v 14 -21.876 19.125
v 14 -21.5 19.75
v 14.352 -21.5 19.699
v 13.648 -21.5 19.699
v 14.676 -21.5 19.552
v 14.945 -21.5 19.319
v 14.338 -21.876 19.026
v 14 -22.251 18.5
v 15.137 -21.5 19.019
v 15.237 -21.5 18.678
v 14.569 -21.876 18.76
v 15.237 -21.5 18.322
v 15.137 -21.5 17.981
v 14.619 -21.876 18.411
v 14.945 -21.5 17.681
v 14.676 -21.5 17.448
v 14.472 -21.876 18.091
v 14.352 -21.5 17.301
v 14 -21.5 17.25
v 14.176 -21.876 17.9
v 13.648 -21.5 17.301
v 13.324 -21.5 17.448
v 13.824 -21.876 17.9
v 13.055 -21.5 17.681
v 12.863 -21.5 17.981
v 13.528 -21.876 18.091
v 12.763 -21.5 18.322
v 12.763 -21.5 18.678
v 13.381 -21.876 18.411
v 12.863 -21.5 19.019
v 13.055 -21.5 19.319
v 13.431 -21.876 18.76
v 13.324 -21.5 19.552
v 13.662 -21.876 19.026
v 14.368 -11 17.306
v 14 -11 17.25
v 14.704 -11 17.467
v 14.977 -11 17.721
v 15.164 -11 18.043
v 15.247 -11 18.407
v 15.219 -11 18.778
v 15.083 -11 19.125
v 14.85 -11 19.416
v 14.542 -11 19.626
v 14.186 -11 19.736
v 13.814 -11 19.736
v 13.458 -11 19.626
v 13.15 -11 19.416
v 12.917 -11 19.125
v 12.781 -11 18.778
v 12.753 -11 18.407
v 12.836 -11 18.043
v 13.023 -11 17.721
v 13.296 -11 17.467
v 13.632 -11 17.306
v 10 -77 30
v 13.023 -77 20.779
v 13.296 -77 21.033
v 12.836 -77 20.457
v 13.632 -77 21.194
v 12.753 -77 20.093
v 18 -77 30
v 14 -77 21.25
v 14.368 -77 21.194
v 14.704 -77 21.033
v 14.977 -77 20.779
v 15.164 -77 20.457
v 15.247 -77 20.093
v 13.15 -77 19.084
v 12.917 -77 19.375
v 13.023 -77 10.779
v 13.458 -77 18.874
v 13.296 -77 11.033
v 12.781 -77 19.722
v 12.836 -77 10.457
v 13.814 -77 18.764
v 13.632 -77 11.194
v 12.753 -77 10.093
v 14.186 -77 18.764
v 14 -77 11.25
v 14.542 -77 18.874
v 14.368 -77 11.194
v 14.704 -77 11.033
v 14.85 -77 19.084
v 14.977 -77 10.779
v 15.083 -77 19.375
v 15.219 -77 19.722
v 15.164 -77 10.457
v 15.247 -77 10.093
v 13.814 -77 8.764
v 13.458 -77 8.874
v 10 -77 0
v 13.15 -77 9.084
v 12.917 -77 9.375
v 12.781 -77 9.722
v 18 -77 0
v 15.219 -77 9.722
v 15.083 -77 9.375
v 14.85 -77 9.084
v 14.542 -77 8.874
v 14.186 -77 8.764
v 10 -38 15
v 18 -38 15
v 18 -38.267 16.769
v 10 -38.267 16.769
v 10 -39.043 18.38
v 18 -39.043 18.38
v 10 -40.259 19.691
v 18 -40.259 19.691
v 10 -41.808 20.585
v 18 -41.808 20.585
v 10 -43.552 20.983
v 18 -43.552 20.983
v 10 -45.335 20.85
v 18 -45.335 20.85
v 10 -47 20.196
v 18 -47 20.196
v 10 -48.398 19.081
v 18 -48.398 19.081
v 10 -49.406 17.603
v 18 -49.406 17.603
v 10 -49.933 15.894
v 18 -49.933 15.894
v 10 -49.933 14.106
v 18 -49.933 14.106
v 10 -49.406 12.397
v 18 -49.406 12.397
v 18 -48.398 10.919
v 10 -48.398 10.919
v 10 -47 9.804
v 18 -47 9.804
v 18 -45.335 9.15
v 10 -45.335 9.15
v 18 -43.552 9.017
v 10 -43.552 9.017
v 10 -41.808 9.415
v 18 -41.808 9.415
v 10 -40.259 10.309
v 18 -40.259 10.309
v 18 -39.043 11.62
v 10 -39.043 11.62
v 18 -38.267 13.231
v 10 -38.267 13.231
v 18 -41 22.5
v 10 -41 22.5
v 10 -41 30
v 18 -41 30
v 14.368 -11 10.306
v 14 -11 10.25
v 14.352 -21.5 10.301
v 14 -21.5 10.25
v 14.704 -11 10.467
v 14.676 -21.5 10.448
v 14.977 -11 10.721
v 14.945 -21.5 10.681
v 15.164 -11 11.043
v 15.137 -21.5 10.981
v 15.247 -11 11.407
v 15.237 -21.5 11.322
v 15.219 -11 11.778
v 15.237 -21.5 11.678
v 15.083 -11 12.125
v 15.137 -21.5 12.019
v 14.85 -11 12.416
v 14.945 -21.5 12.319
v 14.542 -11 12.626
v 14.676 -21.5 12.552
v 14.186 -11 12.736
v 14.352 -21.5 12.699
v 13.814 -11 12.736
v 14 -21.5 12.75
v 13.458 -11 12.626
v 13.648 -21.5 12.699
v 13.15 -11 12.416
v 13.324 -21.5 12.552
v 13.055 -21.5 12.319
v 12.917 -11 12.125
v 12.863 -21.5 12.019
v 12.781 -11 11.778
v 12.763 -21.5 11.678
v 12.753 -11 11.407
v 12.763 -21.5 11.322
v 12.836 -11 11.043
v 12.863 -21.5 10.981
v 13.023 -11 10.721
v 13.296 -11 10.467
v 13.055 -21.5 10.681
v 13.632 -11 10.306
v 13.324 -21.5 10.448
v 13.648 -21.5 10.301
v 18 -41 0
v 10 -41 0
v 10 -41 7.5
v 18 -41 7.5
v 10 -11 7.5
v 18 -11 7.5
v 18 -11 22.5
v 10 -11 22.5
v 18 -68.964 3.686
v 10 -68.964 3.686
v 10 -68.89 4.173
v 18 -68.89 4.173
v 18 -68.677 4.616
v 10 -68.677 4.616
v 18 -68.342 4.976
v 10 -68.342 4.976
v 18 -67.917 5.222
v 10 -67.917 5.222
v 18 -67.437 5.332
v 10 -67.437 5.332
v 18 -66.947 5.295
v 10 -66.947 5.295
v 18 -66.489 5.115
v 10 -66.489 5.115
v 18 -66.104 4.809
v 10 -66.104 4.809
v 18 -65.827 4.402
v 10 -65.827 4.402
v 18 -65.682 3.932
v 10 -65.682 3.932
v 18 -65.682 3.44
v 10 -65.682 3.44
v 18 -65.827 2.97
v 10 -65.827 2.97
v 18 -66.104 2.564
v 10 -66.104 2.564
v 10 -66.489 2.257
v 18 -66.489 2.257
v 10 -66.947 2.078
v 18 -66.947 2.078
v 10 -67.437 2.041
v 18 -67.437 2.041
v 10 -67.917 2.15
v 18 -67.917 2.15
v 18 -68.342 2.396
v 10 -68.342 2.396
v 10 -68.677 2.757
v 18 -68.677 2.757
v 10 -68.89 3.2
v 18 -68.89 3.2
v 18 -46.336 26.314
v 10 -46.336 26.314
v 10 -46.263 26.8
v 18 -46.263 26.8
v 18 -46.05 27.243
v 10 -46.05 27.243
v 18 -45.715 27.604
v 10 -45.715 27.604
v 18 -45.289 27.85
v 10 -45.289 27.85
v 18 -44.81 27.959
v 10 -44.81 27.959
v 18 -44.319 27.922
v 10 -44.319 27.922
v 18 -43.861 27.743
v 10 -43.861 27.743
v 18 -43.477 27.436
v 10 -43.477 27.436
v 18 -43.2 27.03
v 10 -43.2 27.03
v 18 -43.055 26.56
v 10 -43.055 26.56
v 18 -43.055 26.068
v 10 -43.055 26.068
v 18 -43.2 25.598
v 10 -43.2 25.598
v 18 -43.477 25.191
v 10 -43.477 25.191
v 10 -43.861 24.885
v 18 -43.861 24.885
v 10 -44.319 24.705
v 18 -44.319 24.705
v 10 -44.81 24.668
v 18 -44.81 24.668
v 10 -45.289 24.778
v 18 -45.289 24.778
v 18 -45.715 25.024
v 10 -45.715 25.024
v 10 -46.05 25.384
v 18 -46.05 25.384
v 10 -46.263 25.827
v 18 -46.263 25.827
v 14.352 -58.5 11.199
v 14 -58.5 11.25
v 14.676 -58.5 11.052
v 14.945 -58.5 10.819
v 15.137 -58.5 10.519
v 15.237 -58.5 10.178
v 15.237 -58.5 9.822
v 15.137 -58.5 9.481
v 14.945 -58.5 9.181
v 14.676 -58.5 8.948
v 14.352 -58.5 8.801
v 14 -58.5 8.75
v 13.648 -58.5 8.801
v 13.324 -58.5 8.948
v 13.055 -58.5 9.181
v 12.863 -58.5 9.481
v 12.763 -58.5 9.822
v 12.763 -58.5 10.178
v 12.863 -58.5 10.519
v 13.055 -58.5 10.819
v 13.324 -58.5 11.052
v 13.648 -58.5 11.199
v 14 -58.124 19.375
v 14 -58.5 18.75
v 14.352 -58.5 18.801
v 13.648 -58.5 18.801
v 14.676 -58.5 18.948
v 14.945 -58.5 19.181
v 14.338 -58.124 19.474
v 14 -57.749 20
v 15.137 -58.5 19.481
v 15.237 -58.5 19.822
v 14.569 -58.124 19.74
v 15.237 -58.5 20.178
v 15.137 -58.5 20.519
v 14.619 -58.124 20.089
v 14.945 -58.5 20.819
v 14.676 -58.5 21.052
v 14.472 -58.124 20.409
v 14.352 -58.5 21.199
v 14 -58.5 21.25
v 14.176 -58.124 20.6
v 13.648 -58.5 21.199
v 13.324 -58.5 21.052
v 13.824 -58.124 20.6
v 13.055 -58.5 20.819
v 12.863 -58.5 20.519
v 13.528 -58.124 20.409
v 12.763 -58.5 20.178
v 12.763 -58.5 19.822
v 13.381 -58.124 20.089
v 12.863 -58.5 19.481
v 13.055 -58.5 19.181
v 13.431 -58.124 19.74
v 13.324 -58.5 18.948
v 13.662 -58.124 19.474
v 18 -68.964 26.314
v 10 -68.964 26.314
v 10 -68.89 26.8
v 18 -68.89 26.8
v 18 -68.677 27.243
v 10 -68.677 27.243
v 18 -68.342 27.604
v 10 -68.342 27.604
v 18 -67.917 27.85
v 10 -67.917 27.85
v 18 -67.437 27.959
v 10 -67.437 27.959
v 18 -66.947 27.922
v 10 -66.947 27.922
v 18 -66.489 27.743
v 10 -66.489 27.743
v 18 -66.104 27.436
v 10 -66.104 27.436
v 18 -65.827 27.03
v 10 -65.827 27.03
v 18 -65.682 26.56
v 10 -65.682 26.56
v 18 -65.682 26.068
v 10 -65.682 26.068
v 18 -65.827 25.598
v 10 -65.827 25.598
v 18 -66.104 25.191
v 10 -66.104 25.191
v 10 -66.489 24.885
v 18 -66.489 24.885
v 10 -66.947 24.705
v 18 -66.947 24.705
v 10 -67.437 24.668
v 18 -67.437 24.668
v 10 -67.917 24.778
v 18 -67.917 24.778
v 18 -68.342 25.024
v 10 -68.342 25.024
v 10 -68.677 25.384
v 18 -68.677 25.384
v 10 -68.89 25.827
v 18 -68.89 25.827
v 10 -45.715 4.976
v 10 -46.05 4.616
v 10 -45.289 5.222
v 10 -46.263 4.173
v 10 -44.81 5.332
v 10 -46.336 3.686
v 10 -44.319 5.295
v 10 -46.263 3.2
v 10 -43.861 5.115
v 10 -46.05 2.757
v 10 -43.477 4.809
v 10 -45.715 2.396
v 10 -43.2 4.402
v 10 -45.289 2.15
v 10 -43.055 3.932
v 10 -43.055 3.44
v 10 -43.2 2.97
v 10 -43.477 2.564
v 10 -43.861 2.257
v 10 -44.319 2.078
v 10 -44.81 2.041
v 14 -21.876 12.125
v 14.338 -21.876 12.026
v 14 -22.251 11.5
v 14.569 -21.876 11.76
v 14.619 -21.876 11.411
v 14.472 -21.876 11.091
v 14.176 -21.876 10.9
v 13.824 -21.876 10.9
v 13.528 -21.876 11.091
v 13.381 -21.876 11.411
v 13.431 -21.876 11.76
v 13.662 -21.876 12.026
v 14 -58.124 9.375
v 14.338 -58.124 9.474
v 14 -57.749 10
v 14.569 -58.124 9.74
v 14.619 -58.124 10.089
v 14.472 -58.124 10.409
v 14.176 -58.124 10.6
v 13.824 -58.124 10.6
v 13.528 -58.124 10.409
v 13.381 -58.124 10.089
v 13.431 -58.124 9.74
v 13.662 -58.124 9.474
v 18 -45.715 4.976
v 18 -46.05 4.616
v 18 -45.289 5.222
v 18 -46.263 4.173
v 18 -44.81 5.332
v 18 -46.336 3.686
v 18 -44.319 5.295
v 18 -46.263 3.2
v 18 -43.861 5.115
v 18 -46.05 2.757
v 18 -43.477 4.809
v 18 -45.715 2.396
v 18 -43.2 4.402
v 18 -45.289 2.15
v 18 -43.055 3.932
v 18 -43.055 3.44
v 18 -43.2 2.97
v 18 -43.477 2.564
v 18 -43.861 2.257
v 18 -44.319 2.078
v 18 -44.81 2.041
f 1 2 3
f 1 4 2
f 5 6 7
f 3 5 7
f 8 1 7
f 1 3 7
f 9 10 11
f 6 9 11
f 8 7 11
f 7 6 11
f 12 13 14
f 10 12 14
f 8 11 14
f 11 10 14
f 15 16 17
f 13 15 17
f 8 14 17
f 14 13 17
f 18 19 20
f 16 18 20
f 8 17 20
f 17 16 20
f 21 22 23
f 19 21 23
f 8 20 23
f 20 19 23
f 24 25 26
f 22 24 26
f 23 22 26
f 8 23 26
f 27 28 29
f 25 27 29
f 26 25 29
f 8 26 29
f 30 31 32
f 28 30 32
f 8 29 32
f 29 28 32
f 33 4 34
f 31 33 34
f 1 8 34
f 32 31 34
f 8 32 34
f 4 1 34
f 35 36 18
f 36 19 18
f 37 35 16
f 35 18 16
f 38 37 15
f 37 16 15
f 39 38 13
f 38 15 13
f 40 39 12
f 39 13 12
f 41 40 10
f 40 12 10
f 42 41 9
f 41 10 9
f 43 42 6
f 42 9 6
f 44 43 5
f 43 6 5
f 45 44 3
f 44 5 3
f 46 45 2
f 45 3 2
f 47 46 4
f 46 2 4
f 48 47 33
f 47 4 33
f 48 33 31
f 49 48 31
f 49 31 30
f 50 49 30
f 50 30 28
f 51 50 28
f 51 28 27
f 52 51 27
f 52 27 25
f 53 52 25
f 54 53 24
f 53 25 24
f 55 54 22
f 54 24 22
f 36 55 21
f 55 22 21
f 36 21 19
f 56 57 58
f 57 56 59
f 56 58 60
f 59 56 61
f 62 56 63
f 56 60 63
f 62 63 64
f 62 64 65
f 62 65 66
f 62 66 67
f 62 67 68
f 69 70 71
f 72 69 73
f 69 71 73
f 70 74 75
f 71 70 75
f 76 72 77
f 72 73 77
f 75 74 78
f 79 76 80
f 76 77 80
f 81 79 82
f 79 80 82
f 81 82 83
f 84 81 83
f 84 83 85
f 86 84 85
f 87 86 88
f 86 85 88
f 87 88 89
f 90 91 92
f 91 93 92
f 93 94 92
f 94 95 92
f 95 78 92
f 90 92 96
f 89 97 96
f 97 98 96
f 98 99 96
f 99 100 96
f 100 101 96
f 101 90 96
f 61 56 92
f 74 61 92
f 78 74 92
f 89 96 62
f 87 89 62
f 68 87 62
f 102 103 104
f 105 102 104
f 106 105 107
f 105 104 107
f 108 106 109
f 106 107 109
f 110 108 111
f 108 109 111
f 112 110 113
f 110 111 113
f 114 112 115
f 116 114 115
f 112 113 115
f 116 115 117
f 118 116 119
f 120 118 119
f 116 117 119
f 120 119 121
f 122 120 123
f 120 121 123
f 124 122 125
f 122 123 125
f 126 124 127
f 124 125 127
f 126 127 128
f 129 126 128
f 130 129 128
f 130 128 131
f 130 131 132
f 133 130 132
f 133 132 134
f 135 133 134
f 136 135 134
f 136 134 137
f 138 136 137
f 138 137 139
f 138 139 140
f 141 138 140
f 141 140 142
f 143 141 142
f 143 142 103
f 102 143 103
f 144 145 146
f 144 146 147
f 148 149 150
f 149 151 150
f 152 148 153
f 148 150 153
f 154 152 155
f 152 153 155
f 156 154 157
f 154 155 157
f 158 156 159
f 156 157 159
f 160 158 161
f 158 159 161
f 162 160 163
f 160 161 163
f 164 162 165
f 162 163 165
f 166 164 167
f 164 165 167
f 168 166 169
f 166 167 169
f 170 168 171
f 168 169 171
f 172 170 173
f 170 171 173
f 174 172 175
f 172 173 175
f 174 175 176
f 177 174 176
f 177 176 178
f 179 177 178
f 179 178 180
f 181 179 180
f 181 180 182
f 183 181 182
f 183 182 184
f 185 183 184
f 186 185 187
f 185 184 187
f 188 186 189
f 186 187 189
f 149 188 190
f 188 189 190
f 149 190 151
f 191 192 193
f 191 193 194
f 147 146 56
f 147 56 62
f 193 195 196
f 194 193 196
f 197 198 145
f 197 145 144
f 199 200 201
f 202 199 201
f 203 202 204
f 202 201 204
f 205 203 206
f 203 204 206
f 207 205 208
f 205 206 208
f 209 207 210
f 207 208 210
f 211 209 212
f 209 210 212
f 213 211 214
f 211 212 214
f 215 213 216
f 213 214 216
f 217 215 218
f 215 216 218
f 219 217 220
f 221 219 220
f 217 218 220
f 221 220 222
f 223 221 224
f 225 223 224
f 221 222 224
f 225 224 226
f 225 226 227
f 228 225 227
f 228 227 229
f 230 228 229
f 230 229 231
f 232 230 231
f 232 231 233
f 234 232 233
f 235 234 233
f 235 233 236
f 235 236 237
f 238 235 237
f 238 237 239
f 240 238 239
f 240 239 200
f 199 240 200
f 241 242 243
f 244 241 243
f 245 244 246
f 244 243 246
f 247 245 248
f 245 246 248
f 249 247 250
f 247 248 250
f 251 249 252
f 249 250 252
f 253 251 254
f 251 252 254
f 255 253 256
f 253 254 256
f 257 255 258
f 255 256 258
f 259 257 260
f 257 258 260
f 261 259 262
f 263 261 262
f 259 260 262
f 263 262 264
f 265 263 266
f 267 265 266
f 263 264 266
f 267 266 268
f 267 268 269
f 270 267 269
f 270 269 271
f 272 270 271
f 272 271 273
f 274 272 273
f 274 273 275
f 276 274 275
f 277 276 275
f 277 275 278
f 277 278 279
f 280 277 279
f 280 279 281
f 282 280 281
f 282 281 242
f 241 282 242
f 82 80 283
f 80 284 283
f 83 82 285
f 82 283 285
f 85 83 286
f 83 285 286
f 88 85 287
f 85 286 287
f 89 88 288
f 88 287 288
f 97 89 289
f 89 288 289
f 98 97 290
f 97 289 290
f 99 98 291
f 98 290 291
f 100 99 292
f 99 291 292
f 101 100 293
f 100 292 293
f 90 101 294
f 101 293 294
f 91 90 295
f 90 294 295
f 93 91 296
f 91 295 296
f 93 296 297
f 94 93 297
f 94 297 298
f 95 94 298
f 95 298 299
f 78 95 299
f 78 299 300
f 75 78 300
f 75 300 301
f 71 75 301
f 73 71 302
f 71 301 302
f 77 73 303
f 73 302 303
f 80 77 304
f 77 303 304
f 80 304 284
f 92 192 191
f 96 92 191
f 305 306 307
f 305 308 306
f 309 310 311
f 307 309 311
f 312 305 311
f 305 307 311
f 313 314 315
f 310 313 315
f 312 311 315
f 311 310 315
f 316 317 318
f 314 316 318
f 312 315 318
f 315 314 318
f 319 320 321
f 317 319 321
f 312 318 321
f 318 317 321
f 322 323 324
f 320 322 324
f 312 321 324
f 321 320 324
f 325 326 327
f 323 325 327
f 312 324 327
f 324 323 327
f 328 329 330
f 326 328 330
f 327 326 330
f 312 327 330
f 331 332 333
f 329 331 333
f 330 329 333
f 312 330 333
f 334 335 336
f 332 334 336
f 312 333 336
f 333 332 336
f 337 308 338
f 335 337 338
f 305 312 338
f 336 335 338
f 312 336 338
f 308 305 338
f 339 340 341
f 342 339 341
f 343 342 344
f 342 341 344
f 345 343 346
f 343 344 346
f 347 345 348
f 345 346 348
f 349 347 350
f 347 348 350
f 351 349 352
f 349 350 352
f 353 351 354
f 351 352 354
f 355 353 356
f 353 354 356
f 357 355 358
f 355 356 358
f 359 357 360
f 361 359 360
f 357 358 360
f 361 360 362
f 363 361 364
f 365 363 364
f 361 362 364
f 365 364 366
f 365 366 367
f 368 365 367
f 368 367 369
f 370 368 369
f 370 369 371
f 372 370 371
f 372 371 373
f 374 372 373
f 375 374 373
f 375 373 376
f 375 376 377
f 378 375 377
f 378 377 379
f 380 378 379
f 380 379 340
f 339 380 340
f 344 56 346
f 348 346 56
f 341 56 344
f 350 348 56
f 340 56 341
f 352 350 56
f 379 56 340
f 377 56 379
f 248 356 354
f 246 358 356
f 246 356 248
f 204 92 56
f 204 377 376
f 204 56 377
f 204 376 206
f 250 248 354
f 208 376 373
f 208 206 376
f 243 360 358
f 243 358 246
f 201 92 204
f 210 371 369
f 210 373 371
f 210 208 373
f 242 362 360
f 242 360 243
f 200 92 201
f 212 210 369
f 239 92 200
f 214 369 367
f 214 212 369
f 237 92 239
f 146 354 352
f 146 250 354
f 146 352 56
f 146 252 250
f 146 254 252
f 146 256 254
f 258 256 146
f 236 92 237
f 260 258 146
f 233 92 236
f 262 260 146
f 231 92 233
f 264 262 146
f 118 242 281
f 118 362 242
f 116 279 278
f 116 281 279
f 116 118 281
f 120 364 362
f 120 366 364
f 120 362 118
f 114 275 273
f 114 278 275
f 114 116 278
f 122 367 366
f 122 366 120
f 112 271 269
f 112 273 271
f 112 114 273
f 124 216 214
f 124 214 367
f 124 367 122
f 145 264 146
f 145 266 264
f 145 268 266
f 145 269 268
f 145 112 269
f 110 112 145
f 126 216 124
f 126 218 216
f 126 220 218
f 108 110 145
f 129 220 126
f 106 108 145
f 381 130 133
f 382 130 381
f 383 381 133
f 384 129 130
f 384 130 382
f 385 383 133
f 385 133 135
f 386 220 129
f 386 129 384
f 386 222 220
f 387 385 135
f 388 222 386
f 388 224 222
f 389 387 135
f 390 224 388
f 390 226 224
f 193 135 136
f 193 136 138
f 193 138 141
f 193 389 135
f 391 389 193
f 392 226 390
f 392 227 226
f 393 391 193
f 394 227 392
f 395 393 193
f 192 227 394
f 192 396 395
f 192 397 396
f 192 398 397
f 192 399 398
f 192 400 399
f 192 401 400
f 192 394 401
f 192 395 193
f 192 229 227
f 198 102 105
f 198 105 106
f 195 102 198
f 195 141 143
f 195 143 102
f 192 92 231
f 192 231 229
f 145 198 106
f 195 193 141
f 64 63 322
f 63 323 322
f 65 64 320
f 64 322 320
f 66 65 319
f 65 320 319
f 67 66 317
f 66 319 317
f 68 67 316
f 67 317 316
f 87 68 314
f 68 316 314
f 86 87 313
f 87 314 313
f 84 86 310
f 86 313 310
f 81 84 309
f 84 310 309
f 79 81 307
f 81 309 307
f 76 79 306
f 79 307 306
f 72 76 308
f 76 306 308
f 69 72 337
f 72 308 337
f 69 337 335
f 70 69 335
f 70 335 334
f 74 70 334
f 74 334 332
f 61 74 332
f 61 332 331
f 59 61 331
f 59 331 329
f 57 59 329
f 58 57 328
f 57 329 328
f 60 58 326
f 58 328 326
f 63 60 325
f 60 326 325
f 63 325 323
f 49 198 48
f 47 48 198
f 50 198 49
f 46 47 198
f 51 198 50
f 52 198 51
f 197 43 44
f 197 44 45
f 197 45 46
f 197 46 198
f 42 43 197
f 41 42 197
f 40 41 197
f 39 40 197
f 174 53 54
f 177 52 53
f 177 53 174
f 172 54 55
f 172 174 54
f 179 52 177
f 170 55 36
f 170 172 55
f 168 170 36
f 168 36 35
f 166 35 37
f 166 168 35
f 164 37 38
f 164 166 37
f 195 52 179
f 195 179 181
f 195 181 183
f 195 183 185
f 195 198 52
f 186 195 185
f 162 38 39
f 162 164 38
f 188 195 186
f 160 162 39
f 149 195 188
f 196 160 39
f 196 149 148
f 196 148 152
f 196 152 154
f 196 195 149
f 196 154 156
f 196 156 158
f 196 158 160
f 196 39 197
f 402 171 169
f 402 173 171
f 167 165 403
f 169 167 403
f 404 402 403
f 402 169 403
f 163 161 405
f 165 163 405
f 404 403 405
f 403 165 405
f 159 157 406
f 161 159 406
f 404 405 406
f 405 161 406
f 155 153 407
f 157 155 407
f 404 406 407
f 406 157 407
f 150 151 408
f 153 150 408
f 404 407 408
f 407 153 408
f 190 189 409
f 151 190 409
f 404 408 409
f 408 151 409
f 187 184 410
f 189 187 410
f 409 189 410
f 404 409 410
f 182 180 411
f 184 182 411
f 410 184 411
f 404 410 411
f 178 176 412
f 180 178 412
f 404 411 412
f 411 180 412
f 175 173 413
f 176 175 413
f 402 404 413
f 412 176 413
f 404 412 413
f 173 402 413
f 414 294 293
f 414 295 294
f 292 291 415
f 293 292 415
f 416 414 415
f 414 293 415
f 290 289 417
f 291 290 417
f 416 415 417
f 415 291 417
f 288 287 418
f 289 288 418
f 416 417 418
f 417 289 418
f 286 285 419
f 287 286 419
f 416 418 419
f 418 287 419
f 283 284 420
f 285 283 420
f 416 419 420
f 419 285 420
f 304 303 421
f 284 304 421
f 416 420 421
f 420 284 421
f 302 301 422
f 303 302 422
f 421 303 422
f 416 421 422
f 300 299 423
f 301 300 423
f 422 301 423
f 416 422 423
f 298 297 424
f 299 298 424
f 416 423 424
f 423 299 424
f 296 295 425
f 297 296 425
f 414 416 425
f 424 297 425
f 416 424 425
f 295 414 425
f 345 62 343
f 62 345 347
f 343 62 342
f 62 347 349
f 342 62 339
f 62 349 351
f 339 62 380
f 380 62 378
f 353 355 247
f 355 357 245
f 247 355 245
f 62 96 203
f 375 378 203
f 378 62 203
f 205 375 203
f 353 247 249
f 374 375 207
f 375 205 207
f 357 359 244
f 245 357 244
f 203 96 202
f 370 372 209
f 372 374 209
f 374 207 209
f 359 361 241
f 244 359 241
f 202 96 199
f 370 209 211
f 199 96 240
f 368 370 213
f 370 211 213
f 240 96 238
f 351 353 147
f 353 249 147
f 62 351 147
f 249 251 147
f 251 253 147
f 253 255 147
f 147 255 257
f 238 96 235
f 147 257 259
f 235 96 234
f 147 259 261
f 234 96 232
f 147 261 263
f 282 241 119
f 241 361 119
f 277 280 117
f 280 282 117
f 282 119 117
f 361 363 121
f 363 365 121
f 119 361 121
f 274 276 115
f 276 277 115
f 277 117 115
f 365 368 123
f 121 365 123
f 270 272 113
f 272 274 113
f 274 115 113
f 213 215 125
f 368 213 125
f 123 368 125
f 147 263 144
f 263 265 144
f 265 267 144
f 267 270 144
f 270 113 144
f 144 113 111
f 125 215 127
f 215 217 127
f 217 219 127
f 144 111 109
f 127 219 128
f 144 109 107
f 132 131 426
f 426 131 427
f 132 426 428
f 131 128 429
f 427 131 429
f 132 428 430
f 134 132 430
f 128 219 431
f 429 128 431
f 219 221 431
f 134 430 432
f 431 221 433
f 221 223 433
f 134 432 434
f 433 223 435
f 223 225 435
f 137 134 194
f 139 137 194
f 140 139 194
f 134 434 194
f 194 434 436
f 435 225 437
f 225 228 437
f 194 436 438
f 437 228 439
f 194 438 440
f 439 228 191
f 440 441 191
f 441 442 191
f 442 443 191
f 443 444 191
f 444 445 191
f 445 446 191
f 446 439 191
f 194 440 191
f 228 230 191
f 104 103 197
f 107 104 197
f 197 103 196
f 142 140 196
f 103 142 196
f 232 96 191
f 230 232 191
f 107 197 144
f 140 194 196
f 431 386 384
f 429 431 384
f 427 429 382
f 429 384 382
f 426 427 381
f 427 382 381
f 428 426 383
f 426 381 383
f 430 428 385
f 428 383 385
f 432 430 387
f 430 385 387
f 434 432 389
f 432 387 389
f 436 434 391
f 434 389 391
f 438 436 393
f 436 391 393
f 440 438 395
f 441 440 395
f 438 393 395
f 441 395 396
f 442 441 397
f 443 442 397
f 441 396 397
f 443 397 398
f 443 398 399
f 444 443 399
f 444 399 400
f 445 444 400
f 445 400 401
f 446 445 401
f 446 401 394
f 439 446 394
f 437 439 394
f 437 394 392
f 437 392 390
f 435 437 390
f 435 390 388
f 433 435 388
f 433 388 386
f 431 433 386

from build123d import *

# Parameters (mm, degrees)
SKETCH_1_W             = 8
SKETCH_1_H             = 66
EXTRUDE_1_DEPTH        = 30
SKETCH_7_R             = 1.5
CUT_EXTRUDE_2_DEPTH    = 5
HOLE_WIZARD_M4_2_D     = 3.3
HOLE_WIZARD_M4_2_DEPTH = 10.1
HOLE_WIZARD_M4_2_TIP   = 0.991420021
SKETCH_10_R            = 1
CUT_EXTRUDE_4_DEPTH    = 5
HOLE_WIZARD_M3_1_D     = 2.5
HOLE_WIZARD_M3_1_DEPTH = 10.5
HOLE_WIZARD_M3_1_TIP   = 0.751075774
SKETCH_12_R            = 1
CUT_EXTRUDE_5_DEPTH    = 5
HOLE_WIZARD_M3_2_D     = 2.5
HOLE_WIZARD_M3_2_DEPTH = 18.5
HOLE_WIZARD_M3_2_TIP   = 0.751075774
SKETCH_14_W            = 8
SKETCH_14_H            = 7.5
CUT_EXTRUDE_6_DEPTH    = 30
SKETCH_15_R            = 6
CUT_EXTRUDE_7_DEPTH    = 84.024092889


with BuildPart() as part:
    # 草图1 → 凸台-拉伸1 (new body)
    with BuildSketch(Plane.XY):
        with Locations((14, -44)):
            Rectangle(SKETCH_1_W, SKETCH_1_H)
    extrude(amount=EXTRUDE_1_DEPTH)

    # 草图7 → 切除-拉伸2 (cut)
    with BuildSketch(Plane.ZY.offset(-10)):
        with Locations(Location((26.313708499, -44.686291501, 0), (0, 0, 270))):
            Circle(SKETCH_7_R)
        with Locations(Location((3.686291501, -44.686291501, 0), (0, 0, 90))):
            Circle(SKETCH_7_R)
        with Locations(Location((26.313708499, -67.313708499, 0), (0, 0, 90))):
            Circle(SKETCH_7_R)
        with Locations(Location((3.686291501, -67.313708499, 0), (0, 0, 270))):
            Circle(SKETCH_7_R)
    extrude(amount=-CUT_EXTRUDE_2_DEPTH, mode=Mode.SUBTRACT)

    # M4 螺纹孔2
    with Locations(Plane(origin=(18, -44.686291501, 3.686291501), x_dir=(0, 1, 0), z_dir=(1, 0, 0))):
        with Locations((0, 0), (-22.627416998, 0), (-22.627416998, 22.627416998), (0, 22.627416998)):
            Hole(HOLE_WIZARD_M4_2_D / 2, depth=HOLE_WIZARD_M4_2_DEPTH)
            with Locations((0, 0, -(HOLE_WIZARD_M4_2_DEPTH + HOLE_WIZARD_M4_2_TIP / 2))):  # 118° drill point
                Cone(0, HOLE_WIZARD_M4_2_D / 2, HOLE_WIZARD_M4_2_TIP, mode=Mode.SUBTRACT)

    # 草图10 → 切除-拉伸4 (cut)
    with BuildSketch(Plane(origin=(0, -11, 0), x_dir=(1, 0, 0), z_dir=(0, 1, 0))):
        with Locations(Location((14, -11.5, 0), (0, 0, 270))):
            Circle(SKETCH_10_R)
        with Locations(Location((14, -18.5, 0), (0, 0, 270))):
            Circle(SKETCH_10_R)
    extrude(amount=-CUT_EXTRUDE_4_DEPTH, mode=Mode.SUBTRACT)

    # M3 螺纹孔1
    with Locations(Plane(origin=(14, -11, 11.5), x_dir=(0, 0, 1), z_dir=(0, 1, 0))):
        with Locations((0, 0), (7, 0)):
            Hole(HOLE_WIZARD_M3_1_D / 2, depth=HOLE_WIZARD_M3_1_DEPTH)
            with Locations((0, 0, -(HOLE_WIZARD_M3_1_DEPTH + HOLE_WIZARD_M3_1_TIP / 2))):  # 118° drill point
                Cone(0, HOLE_WIZARD_M3_1_D / 2, HOLE_WIZARD_M3_1_TIP, mode=Mode.SUBTRACT)

    # 草图12 → 切除-拉伸5 (cut)
    with BuildSketch(Plane.XZ.offset(77)):
        with Locations(Location((14, 20, 0), (0, 0, 270))):
            Circle(SKETCH_12_R)
        with Locations(Location((14, 10, 0), (0, 0, 270))):
            Circle(SKETCH_12_R)
    extrude(amount=-CUT_EXTRUDE_5_DEPTH, mode=Mode.SUBTRACT)

    # M3 螺纹孔2
    with Locations(Plane(origin=(14, -77, 20), x_dir=(0, 0, -1), z_dir=(0, -1, 0))):
        with Locations((0, 0), (10, 0)):
            Hole(HOLE_WIZARD_M3_2_D / 2, depth=HOLE_WIZARD_M3_2_DEPTH)
            with Locations((0, 0, -(HOLE_WIZARD_M3_2_DEPTH + HOLE_WIZARD_M3_2_TIP / 2))):  # 118° drill point
                Cone(0, HOLE_WIZARD_M3_2_D / 2, HOLE_WIZARD_M3_2_TIP, mode=Mode.SUBTRACT)

    # 草图14 → 切除-拉伸6 (cut)
    with BuildSketch(Plane(origin=(0, -11, 0), x_dir=(1, 0, 0), z_dir=(0, 1, 0))):
        with Locations((14, -3.75)):
            Rectangle(SKETCH_14_W, SKETCH_14_H)
        with Locations((14, -26.25)):
            Rectangle(SKETCH_14_W, SKETCH_14_H)
    extrude(amount=-CUT_EXTRUDE_6_DEPTH, mode=Mode.SUBTRACT)

    # 草图15 → 切除-拉伸7 (cut, through all)
    with BuildSketch(Plane(origin=(18, 0, 0), x_dir=(0, 0, -1), z_dir=(1, 0, 0))):
        with Locations(Location((-15, -44, 0), (0, 0, 90))):
            Circle(SKETCH_15_R)
    extrude(amount=-CUT_EXTRUDE_7_DEPTH, mode=Mode.SUBTRACT)


solid = part.part
